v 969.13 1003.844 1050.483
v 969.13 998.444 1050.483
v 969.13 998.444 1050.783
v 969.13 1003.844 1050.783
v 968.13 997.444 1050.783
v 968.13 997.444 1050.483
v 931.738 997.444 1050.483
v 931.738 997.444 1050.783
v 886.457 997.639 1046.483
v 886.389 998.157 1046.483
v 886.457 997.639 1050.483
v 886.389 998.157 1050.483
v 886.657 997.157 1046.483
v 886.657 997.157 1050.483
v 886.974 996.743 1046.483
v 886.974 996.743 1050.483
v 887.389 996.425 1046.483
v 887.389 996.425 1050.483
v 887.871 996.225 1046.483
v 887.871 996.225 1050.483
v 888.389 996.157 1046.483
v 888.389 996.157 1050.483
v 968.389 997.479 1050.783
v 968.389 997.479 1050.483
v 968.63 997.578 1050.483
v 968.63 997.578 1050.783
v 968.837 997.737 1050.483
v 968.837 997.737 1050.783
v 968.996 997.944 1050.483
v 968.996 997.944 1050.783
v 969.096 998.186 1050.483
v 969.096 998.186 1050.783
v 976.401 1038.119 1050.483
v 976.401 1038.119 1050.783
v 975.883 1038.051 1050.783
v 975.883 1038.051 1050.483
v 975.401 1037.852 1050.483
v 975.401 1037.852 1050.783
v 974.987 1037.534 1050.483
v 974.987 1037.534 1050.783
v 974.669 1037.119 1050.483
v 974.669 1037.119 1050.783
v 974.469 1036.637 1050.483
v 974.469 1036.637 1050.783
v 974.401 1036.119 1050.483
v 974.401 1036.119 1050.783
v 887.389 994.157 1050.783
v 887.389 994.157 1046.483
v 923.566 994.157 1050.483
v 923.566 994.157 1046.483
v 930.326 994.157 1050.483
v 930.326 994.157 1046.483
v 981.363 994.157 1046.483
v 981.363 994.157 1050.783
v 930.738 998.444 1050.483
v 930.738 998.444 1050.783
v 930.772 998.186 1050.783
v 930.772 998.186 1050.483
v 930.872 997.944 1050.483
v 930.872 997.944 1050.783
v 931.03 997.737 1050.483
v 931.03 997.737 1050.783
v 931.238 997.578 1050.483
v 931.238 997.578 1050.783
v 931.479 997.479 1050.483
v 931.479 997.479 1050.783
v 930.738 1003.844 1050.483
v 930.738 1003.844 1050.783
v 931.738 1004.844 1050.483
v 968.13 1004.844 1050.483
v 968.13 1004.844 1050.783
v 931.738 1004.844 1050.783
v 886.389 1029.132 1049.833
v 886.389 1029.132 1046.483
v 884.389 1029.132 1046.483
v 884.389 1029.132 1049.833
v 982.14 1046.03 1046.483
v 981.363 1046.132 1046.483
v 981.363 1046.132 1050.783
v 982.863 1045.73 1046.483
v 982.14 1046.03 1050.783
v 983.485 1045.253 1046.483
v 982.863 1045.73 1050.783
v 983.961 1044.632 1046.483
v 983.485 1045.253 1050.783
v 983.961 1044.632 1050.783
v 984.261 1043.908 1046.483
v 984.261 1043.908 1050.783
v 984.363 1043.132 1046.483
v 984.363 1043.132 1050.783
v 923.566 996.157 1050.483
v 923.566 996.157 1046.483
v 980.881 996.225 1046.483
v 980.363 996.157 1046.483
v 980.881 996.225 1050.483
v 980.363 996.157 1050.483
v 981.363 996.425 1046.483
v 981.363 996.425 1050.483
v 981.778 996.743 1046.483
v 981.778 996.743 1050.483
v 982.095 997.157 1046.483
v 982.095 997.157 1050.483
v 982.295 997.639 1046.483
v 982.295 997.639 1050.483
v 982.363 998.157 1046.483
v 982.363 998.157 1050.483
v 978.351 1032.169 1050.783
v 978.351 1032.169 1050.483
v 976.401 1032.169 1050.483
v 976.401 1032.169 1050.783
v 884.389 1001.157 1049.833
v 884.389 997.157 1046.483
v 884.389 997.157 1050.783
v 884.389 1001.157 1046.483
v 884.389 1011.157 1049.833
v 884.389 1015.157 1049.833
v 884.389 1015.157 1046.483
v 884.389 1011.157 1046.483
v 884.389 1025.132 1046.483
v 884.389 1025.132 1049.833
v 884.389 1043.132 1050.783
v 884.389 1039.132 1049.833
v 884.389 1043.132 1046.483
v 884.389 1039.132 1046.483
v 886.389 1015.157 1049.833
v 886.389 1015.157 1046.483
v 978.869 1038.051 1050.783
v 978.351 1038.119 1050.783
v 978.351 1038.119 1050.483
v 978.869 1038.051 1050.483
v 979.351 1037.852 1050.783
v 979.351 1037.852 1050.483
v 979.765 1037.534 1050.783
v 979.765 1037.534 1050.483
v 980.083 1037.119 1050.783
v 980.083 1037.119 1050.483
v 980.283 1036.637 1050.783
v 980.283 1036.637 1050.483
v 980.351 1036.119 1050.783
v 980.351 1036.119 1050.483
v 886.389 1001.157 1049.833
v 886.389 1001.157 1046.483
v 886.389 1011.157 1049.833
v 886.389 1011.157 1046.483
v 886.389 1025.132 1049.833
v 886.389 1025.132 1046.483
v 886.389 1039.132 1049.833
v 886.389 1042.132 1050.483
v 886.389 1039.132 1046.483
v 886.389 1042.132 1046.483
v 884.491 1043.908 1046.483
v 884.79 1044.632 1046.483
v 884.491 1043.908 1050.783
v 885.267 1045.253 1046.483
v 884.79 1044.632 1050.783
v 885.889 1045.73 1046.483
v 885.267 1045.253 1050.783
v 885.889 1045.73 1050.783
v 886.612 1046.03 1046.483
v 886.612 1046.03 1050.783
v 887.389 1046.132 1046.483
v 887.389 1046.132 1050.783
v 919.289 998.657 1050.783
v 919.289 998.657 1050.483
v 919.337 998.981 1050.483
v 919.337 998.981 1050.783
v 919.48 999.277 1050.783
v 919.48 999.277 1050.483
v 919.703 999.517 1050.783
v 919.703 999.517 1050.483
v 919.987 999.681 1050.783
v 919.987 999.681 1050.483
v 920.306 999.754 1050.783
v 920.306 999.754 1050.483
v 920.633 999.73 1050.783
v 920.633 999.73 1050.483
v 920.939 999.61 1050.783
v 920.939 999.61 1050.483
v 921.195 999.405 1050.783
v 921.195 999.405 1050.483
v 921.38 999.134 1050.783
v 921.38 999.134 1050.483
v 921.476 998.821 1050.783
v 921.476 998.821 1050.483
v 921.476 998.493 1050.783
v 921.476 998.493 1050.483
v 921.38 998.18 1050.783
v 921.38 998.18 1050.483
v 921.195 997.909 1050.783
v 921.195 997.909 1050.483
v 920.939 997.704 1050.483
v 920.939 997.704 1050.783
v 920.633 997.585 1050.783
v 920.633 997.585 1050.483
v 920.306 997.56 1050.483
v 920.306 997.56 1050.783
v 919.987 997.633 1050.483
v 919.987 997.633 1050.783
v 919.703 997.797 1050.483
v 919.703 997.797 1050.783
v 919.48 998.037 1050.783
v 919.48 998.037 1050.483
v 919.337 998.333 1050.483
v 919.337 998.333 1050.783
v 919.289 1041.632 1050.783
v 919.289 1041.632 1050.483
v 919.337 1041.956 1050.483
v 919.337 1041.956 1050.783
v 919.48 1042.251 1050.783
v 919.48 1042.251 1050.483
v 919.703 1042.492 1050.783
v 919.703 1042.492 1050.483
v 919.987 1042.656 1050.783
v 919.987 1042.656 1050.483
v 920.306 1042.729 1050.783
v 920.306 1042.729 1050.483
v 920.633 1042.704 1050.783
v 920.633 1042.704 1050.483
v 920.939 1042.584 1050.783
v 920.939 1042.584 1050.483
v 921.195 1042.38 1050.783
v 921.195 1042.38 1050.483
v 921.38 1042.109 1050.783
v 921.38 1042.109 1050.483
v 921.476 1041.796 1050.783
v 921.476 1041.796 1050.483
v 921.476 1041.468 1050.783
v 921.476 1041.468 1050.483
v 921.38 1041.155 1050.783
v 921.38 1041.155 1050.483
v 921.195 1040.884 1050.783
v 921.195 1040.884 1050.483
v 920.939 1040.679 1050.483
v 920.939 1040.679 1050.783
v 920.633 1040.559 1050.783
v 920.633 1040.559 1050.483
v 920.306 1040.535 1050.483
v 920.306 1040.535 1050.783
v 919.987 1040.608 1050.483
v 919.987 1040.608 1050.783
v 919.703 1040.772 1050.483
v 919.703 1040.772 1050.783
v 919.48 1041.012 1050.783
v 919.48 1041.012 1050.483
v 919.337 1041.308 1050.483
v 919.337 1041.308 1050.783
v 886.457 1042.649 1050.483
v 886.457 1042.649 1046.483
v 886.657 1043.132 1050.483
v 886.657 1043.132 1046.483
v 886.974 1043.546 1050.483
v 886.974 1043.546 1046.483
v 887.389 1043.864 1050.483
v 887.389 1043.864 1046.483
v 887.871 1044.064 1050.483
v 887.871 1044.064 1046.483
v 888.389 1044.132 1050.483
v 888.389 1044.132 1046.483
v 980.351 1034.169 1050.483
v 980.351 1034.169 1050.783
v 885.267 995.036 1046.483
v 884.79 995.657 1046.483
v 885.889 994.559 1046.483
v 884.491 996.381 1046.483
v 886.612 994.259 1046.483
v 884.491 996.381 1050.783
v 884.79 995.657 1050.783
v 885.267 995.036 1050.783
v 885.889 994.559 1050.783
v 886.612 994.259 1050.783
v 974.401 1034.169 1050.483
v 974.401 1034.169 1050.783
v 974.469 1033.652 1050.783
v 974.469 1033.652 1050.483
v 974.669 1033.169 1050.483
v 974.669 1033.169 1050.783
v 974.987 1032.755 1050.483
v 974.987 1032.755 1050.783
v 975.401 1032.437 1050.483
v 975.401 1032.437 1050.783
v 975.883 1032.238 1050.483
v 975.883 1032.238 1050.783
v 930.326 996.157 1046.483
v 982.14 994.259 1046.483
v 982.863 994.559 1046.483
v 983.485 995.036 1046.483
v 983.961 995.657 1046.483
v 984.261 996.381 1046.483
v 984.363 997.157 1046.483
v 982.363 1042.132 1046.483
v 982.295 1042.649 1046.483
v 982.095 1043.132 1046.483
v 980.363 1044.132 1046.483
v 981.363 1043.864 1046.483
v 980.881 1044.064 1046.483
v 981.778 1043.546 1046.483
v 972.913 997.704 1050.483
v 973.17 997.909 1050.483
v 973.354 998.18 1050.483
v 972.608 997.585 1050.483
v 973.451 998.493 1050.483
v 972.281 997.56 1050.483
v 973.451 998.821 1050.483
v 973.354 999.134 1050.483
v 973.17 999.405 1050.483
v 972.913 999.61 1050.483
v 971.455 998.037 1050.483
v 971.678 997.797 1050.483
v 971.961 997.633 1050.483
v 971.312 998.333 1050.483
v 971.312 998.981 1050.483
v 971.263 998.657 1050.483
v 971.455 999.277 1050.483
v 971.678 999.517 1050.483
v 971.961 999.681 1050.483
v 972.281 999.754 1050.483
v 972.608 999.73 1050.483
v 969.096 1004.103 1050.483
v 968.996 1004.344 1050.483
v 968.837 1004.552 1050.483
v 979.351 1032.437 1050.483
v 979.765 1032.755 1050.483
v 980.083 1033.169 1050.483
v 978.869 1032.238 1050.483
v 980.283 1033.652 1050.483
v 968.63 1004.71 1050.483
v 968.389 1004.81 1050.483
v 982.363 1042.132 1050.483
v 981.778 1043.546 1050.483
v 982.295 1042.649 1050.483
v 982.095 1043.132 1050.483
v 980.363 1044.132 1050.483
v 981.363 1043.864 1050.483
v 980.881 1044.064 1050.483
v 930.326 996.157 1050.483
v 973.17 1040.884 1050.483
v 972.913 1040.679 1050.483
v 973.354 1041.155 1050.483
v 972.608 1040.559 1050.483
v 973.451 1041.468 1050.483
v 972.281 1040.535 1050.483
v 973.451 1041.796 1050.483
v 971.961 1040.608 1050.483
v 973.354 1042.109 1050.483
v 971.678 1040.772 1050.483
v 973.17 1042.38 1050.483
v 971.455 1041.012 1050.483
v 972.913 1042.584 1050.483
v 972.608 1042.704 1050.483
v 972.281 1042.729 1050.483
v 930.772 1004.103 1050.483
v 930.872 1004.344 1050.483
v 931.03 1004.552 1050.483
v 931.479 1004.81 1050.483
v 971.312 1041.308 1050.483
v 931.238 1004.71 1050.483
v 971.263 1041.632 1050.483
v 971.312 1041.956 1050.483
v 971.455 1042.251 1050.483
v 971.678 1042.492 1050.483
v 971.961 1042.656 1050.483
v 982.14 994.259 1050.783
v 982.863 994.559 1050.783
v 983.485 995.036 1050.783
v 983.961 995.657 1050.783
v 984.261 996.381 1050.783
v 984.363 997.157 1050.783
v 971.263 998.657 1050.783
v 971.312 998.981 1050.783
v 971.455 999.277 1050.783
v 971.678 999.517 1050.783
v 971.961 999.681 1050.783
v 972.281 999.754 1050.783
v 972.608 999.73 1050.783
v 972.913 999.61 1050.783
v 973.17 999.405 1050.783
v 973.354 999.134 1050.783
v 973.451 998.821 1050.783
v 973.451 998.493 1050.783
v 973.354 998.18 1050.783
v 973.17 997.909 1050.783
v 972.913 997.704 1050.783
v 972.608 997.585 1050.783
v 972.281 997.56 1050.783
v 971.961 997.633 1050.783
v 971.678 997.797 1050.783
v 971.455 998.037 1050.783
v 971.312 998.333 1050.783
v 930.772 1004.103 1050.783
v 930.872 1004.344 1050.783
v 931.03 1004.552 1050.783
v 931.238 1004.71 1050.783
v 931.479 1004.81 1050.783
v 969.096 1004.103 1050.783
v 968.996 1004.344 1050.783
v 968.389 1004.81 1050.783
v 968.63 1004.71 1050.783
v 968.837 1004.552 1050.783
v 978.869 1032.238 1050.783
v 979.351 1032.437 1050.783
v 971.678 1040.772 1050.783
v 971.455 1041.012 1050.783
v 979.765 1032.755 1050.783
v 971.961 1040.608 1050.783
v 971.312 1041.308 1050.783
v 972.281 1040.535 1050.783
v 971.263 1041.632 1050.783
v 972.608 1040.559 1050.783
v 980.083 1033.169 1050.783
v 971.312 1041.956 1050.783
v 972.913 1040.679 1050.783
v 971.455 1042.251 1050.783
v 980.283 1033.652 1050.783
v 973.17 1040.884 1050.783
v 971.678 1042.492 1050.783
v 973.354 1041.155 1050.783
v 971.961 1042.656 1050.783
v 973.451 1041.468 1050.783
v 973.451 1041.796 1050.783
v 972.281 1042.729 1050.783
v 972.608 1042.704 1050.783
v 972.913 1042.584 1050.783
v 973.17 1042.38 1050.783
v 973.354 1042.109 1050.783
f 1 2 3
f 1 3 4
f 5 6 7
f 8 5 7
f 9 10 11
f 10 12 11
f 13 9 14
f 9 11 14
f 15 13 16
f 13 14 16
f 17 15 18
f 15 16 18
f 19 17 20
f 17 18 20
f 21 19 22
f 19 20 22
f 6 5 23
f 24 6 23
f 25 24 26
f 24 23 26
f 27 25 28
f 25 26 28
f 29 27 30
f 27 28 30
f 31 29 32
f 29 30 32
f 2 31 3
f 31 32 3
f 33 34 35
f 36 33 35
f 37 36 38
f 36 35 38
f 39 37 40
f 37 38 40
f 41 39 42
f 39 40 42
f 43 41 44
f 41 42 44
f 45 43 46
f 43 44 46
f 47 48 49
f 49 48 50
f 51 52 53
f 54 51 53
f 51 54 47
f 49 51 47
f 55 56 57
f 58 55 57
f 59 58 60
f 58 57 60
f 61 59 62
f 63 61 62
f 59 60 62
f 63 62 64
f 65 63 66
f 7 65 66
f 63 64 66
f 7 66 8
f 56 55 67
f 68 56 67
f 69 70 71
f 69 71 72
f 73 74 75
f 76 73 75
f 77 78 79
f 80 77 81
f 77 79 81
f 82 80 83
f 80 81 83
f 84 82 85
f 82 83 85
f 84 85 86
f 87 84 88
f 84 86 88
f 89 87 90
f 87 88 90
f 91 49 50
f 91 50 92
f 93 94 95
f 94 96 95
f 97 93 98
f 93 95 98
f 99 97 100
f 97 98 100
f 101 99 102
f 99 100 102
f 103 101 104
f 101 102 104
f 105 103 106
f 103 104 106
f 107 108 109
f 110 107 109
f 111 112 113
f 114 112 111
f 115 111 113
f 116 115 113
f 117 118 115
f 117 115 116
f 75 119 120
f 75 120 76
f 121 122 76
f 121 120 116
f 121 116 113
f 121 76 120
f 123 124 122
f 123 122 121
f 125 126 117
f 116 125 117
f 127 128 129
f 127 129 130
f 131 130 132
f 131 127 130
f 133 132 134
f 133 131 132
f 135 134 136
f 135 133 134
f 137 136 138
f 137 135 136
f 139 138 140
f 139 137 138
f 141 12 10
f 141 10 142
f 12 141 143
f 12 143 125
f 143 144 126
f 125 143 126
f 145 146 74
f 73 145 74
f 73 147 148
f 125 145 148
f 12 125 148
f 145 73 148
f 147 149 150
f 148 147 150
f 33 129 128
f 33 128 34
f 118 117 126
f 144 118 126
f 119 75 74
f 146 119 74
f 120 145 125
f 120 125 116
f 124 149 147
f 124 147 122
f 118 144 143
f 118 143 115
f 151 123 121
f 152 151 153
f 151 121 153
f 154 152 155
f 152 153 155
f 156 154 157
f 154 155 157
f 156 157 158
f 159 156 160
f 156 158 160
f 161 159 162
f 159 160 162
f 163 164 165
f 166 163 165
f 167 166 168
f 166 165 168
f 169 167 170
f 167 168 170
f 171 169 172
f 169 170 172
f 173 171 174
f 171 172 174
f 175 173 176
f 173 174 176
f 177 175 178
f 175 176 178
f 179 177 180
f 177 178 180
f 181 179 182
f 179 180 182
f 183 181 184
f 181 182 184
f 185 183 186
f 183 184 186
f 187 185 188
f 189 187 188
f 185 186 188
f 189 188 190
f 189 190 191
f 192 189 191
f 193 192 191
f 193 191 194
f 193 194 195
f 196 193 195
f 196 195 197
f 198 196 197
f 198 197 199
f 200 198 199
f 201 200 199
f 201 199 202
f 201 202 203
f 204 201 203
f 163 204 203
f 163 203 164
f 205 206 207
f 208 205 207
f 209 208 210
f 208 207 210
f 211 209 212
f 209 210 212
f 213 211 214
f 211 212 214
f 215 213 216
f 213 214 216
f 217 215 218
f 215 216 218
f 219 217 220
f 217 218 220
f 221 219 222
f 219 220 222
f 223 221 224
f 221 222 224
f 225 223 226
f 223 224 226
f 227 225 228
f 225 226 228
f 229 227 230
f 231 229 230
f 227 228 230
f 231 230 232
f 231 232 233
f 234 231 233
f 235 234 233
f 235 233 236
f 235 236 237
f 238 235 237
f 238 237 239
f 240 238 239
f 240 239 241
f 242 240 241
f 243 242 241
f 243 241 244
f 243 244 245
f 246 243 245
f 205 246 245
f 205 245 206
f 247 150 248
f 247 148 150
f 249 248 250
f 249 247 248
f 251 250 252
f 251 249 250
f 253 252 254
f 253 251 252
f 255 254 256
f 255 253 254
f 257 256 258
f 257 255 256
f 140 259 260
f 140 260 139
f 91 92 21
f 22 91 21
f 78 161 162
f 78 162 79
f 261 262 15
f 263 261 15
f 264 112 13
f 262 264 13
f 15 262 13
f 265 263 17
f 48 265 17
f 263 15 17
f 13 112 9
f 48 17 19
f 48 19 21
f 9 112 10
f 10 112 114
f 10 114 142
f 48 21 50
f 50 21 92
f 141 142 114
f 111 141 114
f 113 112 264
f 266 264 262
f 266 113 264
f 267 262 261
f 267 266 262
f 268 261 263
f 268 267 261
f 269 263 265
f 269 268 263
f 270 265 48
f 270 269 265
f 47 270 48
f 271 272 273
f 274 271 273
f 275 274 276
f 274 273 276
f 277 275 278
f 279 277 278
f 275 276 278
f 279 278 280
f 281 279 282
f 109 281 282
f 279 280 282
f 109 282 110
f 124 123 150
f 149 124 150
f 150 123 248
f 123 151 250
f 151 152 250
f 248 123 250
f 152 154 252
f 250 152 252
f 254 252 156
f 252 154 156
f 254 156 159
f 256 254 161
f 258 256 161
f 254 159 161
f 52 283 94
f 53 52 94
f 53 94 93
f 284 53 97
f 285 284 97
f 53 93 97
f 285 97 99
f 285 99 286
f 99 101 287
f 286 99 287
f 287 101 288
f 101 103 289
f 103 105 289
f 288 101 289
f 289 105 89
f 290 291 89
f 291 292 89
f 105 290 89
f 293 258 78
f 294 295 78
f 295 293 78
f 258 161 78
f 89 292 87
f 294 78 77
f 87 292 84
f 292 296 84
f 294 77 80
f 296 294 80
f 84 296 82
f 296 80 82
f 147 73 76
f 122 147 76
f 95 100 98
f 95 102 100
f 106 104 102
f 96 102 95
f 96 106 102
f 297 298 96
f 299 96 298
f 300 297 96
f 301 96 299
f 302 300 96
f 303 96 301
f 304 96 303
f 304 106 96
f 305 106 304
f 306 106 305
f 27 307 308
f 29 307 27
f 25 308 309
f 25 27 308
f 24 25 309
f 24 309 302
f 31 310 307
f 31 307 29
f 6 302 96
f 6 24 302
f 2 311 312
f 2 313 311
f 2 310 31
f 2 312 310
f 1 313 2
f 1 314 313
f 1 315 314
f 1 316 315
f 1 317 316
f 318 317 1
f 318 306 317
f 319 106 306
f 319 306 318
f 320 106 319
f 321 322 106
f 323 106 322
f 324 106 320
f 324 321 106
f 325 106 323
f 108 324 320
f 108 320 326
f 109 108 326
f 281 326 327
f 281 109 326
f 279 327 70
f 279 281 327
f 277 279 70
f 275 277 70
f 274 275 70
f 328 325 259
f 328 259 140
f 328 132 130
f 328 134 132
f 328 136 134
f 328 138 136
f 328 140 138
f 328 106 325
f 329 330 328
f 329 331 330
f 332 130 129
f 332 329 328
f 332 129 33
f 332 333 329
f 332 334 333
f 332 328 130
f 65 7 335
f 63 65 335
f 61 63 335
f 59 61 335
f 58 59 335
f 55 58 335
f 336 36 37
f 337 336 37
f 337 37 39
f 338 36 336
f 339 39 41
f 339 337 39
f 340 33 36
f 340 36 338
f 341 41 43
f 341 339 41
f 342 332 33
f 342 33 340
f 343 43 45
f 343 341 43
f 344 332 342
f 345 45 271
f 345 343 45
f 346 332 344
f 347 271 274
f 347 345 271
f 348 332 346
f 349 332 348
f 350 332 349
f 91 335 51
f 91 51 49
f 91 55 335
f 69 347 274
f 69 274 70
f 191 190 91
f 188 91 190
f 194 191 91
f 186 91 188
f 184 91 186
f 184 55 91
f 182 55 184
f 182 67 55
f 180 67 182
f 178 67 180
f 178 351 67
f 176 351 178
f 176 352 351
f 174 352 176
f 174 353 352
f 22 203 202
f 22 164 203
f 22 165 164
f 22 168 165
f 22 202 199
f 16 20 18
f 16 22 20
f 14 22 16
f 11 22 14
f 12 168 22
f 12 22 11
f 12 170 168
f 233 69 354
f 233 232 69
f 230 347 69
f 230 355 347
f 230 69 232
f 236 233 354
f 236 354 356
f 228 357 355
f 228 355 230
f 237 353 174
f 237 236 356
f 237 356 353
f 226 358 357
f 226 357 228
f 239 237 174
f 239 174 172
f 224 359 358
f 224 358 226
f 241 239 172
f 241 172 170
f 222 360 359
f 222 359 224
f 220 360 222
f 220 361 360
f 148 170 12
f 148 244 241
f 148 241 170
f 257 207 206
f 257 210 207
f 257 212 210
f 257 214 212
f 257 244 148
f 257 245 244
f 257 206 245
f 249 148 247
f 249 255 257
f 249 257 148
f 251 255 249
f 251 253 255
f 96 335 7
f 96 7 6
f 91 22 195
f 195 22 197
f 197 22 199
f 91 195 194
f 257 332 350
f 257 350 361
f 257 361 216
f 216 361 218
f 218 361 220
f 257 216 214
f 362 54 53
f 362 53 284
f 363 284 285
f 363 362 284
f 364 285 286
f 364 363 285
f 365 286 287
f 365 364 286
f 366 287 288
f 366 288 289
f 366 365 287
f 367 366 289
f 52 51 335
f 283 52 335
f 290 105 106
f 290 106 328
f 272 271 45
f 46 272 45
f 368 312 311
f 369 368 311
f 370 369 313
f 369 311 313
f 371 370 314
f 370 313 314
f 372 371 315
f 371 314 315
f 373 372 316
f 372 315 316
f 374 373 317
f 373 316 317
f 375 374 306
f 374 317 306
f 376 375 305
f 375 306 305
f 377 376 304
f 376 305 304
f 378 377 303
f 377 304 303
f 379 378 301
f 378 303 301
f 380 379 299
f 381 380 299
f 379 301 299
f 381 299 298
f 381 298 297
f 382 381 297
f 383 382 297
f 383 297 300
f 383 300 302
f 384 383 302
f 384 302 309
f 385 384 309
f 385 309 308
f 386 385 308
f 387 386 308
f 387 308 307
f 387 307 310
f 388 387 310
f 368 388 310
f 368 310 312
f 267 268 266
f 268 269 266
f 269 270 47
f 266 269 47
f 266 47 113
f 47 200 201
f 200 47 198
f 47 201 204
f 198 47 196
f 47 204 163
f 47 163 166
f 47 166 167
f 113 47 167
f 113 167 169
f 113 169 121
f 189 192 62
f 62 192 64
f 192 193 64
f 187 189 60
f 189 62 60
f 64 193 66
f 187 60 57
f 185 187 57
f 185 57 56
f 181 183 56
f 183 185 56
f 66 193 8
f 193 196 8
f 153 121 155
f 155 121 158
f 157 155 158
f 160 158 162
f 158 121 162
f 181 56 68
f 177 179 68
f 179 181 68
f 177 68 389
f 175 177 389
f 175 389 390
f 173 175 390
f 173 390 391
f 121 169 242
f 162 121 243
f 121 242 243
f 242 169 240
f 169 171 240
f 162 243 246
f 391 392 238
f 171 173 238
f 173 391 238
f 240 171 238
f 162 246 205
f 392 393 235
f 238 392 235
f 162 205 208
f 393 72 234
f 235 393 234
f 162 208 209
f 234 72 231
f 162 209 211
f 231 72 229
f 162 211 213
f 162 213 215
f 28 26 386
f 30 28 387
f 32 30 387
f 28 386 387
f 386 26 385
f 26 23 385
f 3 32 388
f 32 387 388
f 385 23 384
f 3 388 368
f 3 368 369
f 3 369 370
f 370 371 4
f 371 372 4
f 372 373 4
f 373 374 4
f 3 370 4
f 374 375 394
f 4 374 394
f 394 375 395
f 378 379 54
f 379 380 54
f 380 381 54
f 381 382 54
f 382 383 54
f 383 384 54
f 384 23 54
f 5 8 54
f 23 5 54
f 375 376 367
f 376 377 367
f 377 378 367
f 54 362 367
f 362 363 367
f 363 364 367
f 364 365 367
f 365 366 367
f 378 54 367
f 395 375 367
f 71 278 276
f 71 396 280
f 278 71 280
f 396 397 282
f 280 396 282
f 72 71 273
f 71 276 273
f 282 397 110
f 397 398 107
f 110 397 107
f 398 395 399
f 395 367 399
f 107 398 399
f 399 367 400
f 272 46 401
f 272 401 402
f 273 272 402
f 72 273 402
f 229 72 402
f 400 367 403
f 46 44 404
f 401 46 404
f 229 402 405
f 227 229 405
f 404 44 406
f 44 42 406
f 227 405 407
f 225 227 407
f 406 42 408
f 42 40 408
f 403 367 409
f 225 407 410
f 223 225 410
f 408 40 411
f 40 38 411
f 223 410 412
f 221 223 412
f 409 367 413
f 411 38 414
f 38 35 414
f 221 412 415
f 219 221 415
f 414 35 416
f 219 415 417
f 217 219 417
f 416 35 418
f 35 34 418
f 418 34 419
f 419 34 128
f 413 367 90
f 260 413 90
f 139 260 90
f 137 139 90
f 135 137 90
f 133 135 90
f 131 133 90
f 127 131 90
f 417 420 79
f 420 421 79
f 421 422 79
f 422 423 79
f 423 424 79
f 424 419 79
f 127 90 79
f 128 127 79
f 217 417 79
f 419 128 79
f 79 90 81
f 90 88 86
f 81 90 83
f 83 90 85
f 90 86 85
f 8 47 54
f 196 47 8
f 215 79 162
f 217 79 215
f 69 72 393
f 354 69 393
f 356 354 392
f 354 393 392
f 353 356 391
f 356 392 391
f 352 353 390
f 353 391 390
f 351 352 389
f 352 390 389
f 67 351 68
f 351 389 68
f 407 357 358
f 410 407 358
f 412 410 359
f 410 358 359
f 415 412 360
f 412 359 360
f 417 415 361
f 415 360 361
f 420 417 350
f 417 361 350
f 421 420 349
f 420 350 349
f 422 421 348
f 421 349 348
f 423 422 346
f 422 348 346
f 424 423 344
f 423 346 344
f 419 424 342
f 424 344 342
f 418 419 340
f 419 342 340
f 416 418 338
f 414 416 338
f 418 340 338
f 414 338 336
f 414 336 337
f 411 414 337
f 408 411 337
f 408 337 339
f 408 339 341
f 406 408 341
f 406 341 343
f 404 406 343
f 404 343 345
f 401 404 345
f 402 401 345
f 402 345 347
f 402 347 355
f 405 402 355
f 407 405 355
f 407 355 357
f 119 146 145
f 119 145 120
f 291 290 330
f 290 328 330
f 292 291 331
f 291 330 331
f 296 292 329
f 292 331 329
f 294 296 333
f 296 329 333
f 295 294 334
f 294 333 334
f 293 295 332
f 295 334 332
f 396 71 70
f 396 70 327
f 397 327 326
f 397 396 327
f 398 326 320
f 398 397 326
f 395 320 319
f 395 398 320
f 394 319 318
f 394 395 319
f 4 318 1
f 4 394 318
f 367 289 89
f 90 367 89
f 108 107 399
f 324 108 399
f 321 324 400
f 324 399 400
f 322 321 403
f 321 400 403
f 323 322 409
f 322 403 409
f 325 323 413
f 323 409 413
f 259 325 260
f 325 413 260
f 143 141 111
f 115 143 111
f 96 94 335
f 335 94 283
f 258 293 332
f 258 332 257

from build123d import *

# Parameters (mm, degrees)
SKETCH_1_W           = 99.974800609
SKETCH_1_H           = 51.97470409
EXTRUDE_1_DEPTH      = 8.6
SKETCH_2_W           = 95.974800609
SKETCH_2_H           = 47.97470409
CUT_EXTRUDE_1_DEPTH  = 4
SKETCH_3_W           = 2
SKETCH_3_H           = 10
SKETCH_3_H_2         = 9.97470409
CUT_EXTRUDE_2_DEPTH  = 3.35
SKETCH_4_R           = 1.1
SKETCH_4_W           = 38.392586289
SKETCH_4_H           = 7.4
SKETCH_4_W_2         = 5.95
SKETCH_4_H_2         = 5.95
CUT_EXTRUDE_3_DEPTH  = 1437.448457956
FILLET_1_R           = 3
FILLET_3_R           = 2
SKETCH_7_W           = 53.6
SKETCH_7_H           = 10.97470409
CUT_EXTRUDE_14_DEPTH = 4
FILLET_7_R           = 2
FILLET_8_R           = 1
SKETCH_14_W          = 2.323736835
SKETCH_14_H          = 6.8
CUT_EXTRUDE_15_DEPTH = 2
SKETCH_15_W          = 4.3
SKETCH_15_H          = 51.97470409
CUT_EXTRUDE_16_DEPTH = 1490.156636733
SKETCH_6_W           = 6.76
SKETCH_6_H           = 6.795709929
CUT_EXTRUDE_17_DEPTH = 4


with BuildPart() as part:
    # 草图1 → 凸台-拉伸1 (new body)
    with BuildSketch(Plane.XY.offset(1046.483288979)):
        with Locations((934.375963031, 1020.144466268)):
            Rectangle(SKETCH_1_W, SKETCH_1_H)
    extrude(amount=EXTRUDE_1_DEPTH)

    # 草图2 → 切除-拉伸1 (cut)
    with BuildSketch(Plane(origin=(0, 0, 1046.483288979), x_dir=(-1, 0, 0), z_dir=(0, 0, -1))):
        with Locations((-934.375963031, 1020.144466268)):
            Rectangle(SKETCH_2_W, SKETCH_2_H)
    extrude(amount=-CUT_EXTRUDE_1_DEPTH, mode=Mode.SUBTRACT)

    # 草图3 → 切除-拉伸2 (cut)
    with BuildSketch(Plane(origin=(0, 0, 1046.483288979), x_dir=(-1, 0, 0), z_dir=(0, 0, -1))):
        with Locations((-885.388562726, 1034.131818313)):
            Rectangle(SKETCH_3_W, SKETCH_3_H)
        with Locations((-885.388562726, 1020.144466268)):
            Rectangle(SKETCH_3_W, SKETCH_3_H_2)
        with Locations((-885.388562726, 1006.157114223)):
            Rectangle(SKETCH_3_W, SKETCH_3_H)
    extrude(amount=-CUT_EXTRUDE_2_DEPTH, mode=Mode.SUBTRACT)

    # 草图4 → 切除-拉伸3 (cut, through all)
    with BuildSketch(Plane(origin=(0, 0, 1050.483288979), x_dir=(-1, 0, 0), z_dir=(0, 0, -1))):
        with Locations((-920.388562726, 1041.631818313)):
            Circle(SKETCH_4_R)
        with Locations((-920.388562726, 998.657114223)):
            Circle(SKETCH_4_R)
        with Locations((-972.363363335, 998.657114223)):
            Circle(SKETCH_4_R)
        with Locations((-972.363363335, 1041.631818313)):
            Circle(SKETCH_4_R)
        with Locations((-949.933821712, 1001.144429438)):
            Rectangle(SKETCH_4_W, SKETCH_4_H)
        with Locations((-977.376048121, 1035.144495478)):
            Rectangle(SKETCH_4_W_2, SKETCH_4_H_2)
    extrude(amount=-CUT_EXTRUDE_3_DEPTH, mode=Mode.SUBTRACT)

    # 圆角1
    fillet_1_edges = [part.edges().sort_by_distance(p)[0] for p in [
        (884.388562726, 1046.131818313, 1050.783288979),
        (984.363363335, 1046.131818313, 1050.783288979),
        (984.363363335, 994.157114223, 1050.783288979),
        (884.388562726, 994.157114223, 1050.783288979),
    ]]
    fillet(fillet_1_edges, radius=FILLET_1_R)

    # 圆角3
    fillet_3_edges = [part.edges().sort_by_distance(p)[0] for p in [
        (980.351048121, 1032.169495478, 1052.783288979),
        (980.351048121, 1038.119495478, 1052.783288979),
        (974.401048121, 1038.119495478, 1052.783288979),
        (974.401048121, 1032.169495478, 1052.783288979),
    ]]
    fillet(fillet_3_edges, radius=FILLET_3_R)

    # 草图7 → 切除-拉伸14 (cut)
    with BuildSketch(Plane.XY.offset(1055.083288979)):
        Polygon((885.888562726, 1019.831818313), (982.863363335, 1019.831818313), (982.863363335, 1008.131818313), (927.763363335, 1008.131818313), (927.763363335, 1006.631818313), (927.763363335, 995.657114223), (885.888562726, 995.657114223), align=None)
        Polygon((934.163363335, 1044.631818313), (934.163363335, 1033.131818313), (935.663363335, 1033.131818313), (935.663363335, 1044.631818313), (982.863363335, 1044.631818313), (982.863363335, 1021.331818313), (963.463363335, 1021.331818313), (963.463363335, 1032.731818313), (943.963363335, 1032.731818313), (943.963363335, 1031.231818313), (961.963363335, 1031.231818313), (961.963363335, 1021.331818313), (927.563363335, 1021.331818313), (927.563363335, 1032.811818313), (904.363363335, 1032.811818313), (904.363363335, 1044.631818313), align=None)
        with Locations((956.063363335, 1001.144466268)):
            Rectangle(SKETCH_7_W, SKETCH_7_H)
        Polygon((926.063363335, 1021.331818313), (926.063363335, 1031.311818313), (902.863363335, 1031.311818313), (902.863363335, 1044.631818313), (885.888562726, 1044.631818313), (885.888562726, 1021.331818313), align=None)
    extrude(amount=-CUT_EXTRUDE_14_DEPTH, mode=Mode.SUBTRACT)

    # 圆角7
    fillet_7_edges = [part.edges().sort_by_distance(p)[0] for p in [
        (982.363363335, 996.157114223, 1048.483288979),
        (982.363363335, 1044.131818313, 1048.483288979),
        (886.388562726, 1044.131818313, 1048.483288979),
        (886.388562726, 996.157114223, 1048.483288979),
        (982.863363335, 995.657114223, 1053.083288979),
        (929.263363335, 995.657114223, 1053.083288979),
        (929.263363335, 1006.631818313, 1053.083288979),
        (982.863363335, 1006.631818313, 1053.083288979),
        (961.963363335, 1021.331818313, 1053.083288979),
        (927.563363335, 1021.331818313, 1053.083288979),
        (927.563363335, 1032.811818313, 1053.083288979),
        (904.363363335, 1032.811818313, 1053.083288979),
        (904.363363335, 1044.631818313, 1053.083288979),
        (934.163363335, 1044.631818313, 1053.083288979),
        (935.663363335, 1044.631818313, 1053.083288979),
        (982.863363335, 1044.631818313, 1053.083288979),
        (982.863363335, 1021.331818313, 1053.083288979),
        (963.463363335, 1021.331818313, 1053.083288979),
        (963.463363335, 1032.731818313, 1053.083288979),
        (961.963363335, 1031.231818313, 1053.083288979),
        (885.888562726, 1021.331818313, 1053.083288979),
        (885.888562726, 1044.631818313, 1053.083288979),
        (902.863363335, 1044.631818313, 1053.083288979),
        (902.863363335, 1031.311818313, 1053.083288979),
        (926.063363335, 1031.311818313, 1053.083288979),
        (926.063363335, 1021.331818313, 1053.083288979),
        (927.763363335, 995.657114223, 1053.083288979),
        (885.888562726, 995.657114223, 1053.083288979),
        (885.888562726, 1019.831818313, 1053.083288979),
        (982.863363335, 1019.831818313, 1053.083288979),
        (982.863363335, 1008.131818313, 1053.083288979),
        (927.763363335, 1008.131818313, 1053.083288979),
    ]]
    fillet(fillet_7_edges, radius=FILLET_7_R)

    # 圆角8
    fillet_8_edges = [part.edges().sort_by_distance(p)[0] for p in [
        (930.737528567, 997.444429438, 1050.783288979),
        (969.130114856, 997.444429438, 1050.783288979),
        (930.737528567, 1004.844429438, 1050.783288979),
        (969.130114856, 1004.844429438, 1050.783288979),
    ]]
    fillet(fillet_8_edges, radius=FILLET_8_R)

    # 草图14 → 切除-拉伸15 (cut)
    with BuildSketch(Plane.XY.offset(1055.083288979)):
        with Locations((983.201494917, 1013.231818313)):
            Rectangle(SKETCH_14_W, SKETCH_14_H)
    extrude(amount=-CUT_EXTRUDE_15_DEPTH, mode=Mode.SUBTRACT)

    # 草图15 → 切除-拉伸16 (cut, through all)
    with BuildSketch(Plane(origin=(984.363363335, 0, 0), x_dir=(0, 0, -1), z_dir=(1, 0, 0))):
        with Locations((-1052.933288979, 1020.144466268)):
            Rectangle(SKETCH_15_W, SKETCH_15_H)
    extrude(amount=-CUT_EXTRUDE_16_DEPTH, mode=Mode.SUBTRACT)

    # 草图6 → 切除-拉伸17 (cut)
    with BuildSketch(Plane(origin=(0, 0, 1046.483288979), x_dir=(-1, 0, 0), z_dir=(0, 0, -1))):
        with Locations((-926.946347841, 997.554969188)):
            Rectangle(SKETCH_6_W, SKETCH_6_H)
    extrude(amount=-CUT_EXTRUDE_17_DEPTH, mode=Mode.SUBTRACT)


solid = part.part
